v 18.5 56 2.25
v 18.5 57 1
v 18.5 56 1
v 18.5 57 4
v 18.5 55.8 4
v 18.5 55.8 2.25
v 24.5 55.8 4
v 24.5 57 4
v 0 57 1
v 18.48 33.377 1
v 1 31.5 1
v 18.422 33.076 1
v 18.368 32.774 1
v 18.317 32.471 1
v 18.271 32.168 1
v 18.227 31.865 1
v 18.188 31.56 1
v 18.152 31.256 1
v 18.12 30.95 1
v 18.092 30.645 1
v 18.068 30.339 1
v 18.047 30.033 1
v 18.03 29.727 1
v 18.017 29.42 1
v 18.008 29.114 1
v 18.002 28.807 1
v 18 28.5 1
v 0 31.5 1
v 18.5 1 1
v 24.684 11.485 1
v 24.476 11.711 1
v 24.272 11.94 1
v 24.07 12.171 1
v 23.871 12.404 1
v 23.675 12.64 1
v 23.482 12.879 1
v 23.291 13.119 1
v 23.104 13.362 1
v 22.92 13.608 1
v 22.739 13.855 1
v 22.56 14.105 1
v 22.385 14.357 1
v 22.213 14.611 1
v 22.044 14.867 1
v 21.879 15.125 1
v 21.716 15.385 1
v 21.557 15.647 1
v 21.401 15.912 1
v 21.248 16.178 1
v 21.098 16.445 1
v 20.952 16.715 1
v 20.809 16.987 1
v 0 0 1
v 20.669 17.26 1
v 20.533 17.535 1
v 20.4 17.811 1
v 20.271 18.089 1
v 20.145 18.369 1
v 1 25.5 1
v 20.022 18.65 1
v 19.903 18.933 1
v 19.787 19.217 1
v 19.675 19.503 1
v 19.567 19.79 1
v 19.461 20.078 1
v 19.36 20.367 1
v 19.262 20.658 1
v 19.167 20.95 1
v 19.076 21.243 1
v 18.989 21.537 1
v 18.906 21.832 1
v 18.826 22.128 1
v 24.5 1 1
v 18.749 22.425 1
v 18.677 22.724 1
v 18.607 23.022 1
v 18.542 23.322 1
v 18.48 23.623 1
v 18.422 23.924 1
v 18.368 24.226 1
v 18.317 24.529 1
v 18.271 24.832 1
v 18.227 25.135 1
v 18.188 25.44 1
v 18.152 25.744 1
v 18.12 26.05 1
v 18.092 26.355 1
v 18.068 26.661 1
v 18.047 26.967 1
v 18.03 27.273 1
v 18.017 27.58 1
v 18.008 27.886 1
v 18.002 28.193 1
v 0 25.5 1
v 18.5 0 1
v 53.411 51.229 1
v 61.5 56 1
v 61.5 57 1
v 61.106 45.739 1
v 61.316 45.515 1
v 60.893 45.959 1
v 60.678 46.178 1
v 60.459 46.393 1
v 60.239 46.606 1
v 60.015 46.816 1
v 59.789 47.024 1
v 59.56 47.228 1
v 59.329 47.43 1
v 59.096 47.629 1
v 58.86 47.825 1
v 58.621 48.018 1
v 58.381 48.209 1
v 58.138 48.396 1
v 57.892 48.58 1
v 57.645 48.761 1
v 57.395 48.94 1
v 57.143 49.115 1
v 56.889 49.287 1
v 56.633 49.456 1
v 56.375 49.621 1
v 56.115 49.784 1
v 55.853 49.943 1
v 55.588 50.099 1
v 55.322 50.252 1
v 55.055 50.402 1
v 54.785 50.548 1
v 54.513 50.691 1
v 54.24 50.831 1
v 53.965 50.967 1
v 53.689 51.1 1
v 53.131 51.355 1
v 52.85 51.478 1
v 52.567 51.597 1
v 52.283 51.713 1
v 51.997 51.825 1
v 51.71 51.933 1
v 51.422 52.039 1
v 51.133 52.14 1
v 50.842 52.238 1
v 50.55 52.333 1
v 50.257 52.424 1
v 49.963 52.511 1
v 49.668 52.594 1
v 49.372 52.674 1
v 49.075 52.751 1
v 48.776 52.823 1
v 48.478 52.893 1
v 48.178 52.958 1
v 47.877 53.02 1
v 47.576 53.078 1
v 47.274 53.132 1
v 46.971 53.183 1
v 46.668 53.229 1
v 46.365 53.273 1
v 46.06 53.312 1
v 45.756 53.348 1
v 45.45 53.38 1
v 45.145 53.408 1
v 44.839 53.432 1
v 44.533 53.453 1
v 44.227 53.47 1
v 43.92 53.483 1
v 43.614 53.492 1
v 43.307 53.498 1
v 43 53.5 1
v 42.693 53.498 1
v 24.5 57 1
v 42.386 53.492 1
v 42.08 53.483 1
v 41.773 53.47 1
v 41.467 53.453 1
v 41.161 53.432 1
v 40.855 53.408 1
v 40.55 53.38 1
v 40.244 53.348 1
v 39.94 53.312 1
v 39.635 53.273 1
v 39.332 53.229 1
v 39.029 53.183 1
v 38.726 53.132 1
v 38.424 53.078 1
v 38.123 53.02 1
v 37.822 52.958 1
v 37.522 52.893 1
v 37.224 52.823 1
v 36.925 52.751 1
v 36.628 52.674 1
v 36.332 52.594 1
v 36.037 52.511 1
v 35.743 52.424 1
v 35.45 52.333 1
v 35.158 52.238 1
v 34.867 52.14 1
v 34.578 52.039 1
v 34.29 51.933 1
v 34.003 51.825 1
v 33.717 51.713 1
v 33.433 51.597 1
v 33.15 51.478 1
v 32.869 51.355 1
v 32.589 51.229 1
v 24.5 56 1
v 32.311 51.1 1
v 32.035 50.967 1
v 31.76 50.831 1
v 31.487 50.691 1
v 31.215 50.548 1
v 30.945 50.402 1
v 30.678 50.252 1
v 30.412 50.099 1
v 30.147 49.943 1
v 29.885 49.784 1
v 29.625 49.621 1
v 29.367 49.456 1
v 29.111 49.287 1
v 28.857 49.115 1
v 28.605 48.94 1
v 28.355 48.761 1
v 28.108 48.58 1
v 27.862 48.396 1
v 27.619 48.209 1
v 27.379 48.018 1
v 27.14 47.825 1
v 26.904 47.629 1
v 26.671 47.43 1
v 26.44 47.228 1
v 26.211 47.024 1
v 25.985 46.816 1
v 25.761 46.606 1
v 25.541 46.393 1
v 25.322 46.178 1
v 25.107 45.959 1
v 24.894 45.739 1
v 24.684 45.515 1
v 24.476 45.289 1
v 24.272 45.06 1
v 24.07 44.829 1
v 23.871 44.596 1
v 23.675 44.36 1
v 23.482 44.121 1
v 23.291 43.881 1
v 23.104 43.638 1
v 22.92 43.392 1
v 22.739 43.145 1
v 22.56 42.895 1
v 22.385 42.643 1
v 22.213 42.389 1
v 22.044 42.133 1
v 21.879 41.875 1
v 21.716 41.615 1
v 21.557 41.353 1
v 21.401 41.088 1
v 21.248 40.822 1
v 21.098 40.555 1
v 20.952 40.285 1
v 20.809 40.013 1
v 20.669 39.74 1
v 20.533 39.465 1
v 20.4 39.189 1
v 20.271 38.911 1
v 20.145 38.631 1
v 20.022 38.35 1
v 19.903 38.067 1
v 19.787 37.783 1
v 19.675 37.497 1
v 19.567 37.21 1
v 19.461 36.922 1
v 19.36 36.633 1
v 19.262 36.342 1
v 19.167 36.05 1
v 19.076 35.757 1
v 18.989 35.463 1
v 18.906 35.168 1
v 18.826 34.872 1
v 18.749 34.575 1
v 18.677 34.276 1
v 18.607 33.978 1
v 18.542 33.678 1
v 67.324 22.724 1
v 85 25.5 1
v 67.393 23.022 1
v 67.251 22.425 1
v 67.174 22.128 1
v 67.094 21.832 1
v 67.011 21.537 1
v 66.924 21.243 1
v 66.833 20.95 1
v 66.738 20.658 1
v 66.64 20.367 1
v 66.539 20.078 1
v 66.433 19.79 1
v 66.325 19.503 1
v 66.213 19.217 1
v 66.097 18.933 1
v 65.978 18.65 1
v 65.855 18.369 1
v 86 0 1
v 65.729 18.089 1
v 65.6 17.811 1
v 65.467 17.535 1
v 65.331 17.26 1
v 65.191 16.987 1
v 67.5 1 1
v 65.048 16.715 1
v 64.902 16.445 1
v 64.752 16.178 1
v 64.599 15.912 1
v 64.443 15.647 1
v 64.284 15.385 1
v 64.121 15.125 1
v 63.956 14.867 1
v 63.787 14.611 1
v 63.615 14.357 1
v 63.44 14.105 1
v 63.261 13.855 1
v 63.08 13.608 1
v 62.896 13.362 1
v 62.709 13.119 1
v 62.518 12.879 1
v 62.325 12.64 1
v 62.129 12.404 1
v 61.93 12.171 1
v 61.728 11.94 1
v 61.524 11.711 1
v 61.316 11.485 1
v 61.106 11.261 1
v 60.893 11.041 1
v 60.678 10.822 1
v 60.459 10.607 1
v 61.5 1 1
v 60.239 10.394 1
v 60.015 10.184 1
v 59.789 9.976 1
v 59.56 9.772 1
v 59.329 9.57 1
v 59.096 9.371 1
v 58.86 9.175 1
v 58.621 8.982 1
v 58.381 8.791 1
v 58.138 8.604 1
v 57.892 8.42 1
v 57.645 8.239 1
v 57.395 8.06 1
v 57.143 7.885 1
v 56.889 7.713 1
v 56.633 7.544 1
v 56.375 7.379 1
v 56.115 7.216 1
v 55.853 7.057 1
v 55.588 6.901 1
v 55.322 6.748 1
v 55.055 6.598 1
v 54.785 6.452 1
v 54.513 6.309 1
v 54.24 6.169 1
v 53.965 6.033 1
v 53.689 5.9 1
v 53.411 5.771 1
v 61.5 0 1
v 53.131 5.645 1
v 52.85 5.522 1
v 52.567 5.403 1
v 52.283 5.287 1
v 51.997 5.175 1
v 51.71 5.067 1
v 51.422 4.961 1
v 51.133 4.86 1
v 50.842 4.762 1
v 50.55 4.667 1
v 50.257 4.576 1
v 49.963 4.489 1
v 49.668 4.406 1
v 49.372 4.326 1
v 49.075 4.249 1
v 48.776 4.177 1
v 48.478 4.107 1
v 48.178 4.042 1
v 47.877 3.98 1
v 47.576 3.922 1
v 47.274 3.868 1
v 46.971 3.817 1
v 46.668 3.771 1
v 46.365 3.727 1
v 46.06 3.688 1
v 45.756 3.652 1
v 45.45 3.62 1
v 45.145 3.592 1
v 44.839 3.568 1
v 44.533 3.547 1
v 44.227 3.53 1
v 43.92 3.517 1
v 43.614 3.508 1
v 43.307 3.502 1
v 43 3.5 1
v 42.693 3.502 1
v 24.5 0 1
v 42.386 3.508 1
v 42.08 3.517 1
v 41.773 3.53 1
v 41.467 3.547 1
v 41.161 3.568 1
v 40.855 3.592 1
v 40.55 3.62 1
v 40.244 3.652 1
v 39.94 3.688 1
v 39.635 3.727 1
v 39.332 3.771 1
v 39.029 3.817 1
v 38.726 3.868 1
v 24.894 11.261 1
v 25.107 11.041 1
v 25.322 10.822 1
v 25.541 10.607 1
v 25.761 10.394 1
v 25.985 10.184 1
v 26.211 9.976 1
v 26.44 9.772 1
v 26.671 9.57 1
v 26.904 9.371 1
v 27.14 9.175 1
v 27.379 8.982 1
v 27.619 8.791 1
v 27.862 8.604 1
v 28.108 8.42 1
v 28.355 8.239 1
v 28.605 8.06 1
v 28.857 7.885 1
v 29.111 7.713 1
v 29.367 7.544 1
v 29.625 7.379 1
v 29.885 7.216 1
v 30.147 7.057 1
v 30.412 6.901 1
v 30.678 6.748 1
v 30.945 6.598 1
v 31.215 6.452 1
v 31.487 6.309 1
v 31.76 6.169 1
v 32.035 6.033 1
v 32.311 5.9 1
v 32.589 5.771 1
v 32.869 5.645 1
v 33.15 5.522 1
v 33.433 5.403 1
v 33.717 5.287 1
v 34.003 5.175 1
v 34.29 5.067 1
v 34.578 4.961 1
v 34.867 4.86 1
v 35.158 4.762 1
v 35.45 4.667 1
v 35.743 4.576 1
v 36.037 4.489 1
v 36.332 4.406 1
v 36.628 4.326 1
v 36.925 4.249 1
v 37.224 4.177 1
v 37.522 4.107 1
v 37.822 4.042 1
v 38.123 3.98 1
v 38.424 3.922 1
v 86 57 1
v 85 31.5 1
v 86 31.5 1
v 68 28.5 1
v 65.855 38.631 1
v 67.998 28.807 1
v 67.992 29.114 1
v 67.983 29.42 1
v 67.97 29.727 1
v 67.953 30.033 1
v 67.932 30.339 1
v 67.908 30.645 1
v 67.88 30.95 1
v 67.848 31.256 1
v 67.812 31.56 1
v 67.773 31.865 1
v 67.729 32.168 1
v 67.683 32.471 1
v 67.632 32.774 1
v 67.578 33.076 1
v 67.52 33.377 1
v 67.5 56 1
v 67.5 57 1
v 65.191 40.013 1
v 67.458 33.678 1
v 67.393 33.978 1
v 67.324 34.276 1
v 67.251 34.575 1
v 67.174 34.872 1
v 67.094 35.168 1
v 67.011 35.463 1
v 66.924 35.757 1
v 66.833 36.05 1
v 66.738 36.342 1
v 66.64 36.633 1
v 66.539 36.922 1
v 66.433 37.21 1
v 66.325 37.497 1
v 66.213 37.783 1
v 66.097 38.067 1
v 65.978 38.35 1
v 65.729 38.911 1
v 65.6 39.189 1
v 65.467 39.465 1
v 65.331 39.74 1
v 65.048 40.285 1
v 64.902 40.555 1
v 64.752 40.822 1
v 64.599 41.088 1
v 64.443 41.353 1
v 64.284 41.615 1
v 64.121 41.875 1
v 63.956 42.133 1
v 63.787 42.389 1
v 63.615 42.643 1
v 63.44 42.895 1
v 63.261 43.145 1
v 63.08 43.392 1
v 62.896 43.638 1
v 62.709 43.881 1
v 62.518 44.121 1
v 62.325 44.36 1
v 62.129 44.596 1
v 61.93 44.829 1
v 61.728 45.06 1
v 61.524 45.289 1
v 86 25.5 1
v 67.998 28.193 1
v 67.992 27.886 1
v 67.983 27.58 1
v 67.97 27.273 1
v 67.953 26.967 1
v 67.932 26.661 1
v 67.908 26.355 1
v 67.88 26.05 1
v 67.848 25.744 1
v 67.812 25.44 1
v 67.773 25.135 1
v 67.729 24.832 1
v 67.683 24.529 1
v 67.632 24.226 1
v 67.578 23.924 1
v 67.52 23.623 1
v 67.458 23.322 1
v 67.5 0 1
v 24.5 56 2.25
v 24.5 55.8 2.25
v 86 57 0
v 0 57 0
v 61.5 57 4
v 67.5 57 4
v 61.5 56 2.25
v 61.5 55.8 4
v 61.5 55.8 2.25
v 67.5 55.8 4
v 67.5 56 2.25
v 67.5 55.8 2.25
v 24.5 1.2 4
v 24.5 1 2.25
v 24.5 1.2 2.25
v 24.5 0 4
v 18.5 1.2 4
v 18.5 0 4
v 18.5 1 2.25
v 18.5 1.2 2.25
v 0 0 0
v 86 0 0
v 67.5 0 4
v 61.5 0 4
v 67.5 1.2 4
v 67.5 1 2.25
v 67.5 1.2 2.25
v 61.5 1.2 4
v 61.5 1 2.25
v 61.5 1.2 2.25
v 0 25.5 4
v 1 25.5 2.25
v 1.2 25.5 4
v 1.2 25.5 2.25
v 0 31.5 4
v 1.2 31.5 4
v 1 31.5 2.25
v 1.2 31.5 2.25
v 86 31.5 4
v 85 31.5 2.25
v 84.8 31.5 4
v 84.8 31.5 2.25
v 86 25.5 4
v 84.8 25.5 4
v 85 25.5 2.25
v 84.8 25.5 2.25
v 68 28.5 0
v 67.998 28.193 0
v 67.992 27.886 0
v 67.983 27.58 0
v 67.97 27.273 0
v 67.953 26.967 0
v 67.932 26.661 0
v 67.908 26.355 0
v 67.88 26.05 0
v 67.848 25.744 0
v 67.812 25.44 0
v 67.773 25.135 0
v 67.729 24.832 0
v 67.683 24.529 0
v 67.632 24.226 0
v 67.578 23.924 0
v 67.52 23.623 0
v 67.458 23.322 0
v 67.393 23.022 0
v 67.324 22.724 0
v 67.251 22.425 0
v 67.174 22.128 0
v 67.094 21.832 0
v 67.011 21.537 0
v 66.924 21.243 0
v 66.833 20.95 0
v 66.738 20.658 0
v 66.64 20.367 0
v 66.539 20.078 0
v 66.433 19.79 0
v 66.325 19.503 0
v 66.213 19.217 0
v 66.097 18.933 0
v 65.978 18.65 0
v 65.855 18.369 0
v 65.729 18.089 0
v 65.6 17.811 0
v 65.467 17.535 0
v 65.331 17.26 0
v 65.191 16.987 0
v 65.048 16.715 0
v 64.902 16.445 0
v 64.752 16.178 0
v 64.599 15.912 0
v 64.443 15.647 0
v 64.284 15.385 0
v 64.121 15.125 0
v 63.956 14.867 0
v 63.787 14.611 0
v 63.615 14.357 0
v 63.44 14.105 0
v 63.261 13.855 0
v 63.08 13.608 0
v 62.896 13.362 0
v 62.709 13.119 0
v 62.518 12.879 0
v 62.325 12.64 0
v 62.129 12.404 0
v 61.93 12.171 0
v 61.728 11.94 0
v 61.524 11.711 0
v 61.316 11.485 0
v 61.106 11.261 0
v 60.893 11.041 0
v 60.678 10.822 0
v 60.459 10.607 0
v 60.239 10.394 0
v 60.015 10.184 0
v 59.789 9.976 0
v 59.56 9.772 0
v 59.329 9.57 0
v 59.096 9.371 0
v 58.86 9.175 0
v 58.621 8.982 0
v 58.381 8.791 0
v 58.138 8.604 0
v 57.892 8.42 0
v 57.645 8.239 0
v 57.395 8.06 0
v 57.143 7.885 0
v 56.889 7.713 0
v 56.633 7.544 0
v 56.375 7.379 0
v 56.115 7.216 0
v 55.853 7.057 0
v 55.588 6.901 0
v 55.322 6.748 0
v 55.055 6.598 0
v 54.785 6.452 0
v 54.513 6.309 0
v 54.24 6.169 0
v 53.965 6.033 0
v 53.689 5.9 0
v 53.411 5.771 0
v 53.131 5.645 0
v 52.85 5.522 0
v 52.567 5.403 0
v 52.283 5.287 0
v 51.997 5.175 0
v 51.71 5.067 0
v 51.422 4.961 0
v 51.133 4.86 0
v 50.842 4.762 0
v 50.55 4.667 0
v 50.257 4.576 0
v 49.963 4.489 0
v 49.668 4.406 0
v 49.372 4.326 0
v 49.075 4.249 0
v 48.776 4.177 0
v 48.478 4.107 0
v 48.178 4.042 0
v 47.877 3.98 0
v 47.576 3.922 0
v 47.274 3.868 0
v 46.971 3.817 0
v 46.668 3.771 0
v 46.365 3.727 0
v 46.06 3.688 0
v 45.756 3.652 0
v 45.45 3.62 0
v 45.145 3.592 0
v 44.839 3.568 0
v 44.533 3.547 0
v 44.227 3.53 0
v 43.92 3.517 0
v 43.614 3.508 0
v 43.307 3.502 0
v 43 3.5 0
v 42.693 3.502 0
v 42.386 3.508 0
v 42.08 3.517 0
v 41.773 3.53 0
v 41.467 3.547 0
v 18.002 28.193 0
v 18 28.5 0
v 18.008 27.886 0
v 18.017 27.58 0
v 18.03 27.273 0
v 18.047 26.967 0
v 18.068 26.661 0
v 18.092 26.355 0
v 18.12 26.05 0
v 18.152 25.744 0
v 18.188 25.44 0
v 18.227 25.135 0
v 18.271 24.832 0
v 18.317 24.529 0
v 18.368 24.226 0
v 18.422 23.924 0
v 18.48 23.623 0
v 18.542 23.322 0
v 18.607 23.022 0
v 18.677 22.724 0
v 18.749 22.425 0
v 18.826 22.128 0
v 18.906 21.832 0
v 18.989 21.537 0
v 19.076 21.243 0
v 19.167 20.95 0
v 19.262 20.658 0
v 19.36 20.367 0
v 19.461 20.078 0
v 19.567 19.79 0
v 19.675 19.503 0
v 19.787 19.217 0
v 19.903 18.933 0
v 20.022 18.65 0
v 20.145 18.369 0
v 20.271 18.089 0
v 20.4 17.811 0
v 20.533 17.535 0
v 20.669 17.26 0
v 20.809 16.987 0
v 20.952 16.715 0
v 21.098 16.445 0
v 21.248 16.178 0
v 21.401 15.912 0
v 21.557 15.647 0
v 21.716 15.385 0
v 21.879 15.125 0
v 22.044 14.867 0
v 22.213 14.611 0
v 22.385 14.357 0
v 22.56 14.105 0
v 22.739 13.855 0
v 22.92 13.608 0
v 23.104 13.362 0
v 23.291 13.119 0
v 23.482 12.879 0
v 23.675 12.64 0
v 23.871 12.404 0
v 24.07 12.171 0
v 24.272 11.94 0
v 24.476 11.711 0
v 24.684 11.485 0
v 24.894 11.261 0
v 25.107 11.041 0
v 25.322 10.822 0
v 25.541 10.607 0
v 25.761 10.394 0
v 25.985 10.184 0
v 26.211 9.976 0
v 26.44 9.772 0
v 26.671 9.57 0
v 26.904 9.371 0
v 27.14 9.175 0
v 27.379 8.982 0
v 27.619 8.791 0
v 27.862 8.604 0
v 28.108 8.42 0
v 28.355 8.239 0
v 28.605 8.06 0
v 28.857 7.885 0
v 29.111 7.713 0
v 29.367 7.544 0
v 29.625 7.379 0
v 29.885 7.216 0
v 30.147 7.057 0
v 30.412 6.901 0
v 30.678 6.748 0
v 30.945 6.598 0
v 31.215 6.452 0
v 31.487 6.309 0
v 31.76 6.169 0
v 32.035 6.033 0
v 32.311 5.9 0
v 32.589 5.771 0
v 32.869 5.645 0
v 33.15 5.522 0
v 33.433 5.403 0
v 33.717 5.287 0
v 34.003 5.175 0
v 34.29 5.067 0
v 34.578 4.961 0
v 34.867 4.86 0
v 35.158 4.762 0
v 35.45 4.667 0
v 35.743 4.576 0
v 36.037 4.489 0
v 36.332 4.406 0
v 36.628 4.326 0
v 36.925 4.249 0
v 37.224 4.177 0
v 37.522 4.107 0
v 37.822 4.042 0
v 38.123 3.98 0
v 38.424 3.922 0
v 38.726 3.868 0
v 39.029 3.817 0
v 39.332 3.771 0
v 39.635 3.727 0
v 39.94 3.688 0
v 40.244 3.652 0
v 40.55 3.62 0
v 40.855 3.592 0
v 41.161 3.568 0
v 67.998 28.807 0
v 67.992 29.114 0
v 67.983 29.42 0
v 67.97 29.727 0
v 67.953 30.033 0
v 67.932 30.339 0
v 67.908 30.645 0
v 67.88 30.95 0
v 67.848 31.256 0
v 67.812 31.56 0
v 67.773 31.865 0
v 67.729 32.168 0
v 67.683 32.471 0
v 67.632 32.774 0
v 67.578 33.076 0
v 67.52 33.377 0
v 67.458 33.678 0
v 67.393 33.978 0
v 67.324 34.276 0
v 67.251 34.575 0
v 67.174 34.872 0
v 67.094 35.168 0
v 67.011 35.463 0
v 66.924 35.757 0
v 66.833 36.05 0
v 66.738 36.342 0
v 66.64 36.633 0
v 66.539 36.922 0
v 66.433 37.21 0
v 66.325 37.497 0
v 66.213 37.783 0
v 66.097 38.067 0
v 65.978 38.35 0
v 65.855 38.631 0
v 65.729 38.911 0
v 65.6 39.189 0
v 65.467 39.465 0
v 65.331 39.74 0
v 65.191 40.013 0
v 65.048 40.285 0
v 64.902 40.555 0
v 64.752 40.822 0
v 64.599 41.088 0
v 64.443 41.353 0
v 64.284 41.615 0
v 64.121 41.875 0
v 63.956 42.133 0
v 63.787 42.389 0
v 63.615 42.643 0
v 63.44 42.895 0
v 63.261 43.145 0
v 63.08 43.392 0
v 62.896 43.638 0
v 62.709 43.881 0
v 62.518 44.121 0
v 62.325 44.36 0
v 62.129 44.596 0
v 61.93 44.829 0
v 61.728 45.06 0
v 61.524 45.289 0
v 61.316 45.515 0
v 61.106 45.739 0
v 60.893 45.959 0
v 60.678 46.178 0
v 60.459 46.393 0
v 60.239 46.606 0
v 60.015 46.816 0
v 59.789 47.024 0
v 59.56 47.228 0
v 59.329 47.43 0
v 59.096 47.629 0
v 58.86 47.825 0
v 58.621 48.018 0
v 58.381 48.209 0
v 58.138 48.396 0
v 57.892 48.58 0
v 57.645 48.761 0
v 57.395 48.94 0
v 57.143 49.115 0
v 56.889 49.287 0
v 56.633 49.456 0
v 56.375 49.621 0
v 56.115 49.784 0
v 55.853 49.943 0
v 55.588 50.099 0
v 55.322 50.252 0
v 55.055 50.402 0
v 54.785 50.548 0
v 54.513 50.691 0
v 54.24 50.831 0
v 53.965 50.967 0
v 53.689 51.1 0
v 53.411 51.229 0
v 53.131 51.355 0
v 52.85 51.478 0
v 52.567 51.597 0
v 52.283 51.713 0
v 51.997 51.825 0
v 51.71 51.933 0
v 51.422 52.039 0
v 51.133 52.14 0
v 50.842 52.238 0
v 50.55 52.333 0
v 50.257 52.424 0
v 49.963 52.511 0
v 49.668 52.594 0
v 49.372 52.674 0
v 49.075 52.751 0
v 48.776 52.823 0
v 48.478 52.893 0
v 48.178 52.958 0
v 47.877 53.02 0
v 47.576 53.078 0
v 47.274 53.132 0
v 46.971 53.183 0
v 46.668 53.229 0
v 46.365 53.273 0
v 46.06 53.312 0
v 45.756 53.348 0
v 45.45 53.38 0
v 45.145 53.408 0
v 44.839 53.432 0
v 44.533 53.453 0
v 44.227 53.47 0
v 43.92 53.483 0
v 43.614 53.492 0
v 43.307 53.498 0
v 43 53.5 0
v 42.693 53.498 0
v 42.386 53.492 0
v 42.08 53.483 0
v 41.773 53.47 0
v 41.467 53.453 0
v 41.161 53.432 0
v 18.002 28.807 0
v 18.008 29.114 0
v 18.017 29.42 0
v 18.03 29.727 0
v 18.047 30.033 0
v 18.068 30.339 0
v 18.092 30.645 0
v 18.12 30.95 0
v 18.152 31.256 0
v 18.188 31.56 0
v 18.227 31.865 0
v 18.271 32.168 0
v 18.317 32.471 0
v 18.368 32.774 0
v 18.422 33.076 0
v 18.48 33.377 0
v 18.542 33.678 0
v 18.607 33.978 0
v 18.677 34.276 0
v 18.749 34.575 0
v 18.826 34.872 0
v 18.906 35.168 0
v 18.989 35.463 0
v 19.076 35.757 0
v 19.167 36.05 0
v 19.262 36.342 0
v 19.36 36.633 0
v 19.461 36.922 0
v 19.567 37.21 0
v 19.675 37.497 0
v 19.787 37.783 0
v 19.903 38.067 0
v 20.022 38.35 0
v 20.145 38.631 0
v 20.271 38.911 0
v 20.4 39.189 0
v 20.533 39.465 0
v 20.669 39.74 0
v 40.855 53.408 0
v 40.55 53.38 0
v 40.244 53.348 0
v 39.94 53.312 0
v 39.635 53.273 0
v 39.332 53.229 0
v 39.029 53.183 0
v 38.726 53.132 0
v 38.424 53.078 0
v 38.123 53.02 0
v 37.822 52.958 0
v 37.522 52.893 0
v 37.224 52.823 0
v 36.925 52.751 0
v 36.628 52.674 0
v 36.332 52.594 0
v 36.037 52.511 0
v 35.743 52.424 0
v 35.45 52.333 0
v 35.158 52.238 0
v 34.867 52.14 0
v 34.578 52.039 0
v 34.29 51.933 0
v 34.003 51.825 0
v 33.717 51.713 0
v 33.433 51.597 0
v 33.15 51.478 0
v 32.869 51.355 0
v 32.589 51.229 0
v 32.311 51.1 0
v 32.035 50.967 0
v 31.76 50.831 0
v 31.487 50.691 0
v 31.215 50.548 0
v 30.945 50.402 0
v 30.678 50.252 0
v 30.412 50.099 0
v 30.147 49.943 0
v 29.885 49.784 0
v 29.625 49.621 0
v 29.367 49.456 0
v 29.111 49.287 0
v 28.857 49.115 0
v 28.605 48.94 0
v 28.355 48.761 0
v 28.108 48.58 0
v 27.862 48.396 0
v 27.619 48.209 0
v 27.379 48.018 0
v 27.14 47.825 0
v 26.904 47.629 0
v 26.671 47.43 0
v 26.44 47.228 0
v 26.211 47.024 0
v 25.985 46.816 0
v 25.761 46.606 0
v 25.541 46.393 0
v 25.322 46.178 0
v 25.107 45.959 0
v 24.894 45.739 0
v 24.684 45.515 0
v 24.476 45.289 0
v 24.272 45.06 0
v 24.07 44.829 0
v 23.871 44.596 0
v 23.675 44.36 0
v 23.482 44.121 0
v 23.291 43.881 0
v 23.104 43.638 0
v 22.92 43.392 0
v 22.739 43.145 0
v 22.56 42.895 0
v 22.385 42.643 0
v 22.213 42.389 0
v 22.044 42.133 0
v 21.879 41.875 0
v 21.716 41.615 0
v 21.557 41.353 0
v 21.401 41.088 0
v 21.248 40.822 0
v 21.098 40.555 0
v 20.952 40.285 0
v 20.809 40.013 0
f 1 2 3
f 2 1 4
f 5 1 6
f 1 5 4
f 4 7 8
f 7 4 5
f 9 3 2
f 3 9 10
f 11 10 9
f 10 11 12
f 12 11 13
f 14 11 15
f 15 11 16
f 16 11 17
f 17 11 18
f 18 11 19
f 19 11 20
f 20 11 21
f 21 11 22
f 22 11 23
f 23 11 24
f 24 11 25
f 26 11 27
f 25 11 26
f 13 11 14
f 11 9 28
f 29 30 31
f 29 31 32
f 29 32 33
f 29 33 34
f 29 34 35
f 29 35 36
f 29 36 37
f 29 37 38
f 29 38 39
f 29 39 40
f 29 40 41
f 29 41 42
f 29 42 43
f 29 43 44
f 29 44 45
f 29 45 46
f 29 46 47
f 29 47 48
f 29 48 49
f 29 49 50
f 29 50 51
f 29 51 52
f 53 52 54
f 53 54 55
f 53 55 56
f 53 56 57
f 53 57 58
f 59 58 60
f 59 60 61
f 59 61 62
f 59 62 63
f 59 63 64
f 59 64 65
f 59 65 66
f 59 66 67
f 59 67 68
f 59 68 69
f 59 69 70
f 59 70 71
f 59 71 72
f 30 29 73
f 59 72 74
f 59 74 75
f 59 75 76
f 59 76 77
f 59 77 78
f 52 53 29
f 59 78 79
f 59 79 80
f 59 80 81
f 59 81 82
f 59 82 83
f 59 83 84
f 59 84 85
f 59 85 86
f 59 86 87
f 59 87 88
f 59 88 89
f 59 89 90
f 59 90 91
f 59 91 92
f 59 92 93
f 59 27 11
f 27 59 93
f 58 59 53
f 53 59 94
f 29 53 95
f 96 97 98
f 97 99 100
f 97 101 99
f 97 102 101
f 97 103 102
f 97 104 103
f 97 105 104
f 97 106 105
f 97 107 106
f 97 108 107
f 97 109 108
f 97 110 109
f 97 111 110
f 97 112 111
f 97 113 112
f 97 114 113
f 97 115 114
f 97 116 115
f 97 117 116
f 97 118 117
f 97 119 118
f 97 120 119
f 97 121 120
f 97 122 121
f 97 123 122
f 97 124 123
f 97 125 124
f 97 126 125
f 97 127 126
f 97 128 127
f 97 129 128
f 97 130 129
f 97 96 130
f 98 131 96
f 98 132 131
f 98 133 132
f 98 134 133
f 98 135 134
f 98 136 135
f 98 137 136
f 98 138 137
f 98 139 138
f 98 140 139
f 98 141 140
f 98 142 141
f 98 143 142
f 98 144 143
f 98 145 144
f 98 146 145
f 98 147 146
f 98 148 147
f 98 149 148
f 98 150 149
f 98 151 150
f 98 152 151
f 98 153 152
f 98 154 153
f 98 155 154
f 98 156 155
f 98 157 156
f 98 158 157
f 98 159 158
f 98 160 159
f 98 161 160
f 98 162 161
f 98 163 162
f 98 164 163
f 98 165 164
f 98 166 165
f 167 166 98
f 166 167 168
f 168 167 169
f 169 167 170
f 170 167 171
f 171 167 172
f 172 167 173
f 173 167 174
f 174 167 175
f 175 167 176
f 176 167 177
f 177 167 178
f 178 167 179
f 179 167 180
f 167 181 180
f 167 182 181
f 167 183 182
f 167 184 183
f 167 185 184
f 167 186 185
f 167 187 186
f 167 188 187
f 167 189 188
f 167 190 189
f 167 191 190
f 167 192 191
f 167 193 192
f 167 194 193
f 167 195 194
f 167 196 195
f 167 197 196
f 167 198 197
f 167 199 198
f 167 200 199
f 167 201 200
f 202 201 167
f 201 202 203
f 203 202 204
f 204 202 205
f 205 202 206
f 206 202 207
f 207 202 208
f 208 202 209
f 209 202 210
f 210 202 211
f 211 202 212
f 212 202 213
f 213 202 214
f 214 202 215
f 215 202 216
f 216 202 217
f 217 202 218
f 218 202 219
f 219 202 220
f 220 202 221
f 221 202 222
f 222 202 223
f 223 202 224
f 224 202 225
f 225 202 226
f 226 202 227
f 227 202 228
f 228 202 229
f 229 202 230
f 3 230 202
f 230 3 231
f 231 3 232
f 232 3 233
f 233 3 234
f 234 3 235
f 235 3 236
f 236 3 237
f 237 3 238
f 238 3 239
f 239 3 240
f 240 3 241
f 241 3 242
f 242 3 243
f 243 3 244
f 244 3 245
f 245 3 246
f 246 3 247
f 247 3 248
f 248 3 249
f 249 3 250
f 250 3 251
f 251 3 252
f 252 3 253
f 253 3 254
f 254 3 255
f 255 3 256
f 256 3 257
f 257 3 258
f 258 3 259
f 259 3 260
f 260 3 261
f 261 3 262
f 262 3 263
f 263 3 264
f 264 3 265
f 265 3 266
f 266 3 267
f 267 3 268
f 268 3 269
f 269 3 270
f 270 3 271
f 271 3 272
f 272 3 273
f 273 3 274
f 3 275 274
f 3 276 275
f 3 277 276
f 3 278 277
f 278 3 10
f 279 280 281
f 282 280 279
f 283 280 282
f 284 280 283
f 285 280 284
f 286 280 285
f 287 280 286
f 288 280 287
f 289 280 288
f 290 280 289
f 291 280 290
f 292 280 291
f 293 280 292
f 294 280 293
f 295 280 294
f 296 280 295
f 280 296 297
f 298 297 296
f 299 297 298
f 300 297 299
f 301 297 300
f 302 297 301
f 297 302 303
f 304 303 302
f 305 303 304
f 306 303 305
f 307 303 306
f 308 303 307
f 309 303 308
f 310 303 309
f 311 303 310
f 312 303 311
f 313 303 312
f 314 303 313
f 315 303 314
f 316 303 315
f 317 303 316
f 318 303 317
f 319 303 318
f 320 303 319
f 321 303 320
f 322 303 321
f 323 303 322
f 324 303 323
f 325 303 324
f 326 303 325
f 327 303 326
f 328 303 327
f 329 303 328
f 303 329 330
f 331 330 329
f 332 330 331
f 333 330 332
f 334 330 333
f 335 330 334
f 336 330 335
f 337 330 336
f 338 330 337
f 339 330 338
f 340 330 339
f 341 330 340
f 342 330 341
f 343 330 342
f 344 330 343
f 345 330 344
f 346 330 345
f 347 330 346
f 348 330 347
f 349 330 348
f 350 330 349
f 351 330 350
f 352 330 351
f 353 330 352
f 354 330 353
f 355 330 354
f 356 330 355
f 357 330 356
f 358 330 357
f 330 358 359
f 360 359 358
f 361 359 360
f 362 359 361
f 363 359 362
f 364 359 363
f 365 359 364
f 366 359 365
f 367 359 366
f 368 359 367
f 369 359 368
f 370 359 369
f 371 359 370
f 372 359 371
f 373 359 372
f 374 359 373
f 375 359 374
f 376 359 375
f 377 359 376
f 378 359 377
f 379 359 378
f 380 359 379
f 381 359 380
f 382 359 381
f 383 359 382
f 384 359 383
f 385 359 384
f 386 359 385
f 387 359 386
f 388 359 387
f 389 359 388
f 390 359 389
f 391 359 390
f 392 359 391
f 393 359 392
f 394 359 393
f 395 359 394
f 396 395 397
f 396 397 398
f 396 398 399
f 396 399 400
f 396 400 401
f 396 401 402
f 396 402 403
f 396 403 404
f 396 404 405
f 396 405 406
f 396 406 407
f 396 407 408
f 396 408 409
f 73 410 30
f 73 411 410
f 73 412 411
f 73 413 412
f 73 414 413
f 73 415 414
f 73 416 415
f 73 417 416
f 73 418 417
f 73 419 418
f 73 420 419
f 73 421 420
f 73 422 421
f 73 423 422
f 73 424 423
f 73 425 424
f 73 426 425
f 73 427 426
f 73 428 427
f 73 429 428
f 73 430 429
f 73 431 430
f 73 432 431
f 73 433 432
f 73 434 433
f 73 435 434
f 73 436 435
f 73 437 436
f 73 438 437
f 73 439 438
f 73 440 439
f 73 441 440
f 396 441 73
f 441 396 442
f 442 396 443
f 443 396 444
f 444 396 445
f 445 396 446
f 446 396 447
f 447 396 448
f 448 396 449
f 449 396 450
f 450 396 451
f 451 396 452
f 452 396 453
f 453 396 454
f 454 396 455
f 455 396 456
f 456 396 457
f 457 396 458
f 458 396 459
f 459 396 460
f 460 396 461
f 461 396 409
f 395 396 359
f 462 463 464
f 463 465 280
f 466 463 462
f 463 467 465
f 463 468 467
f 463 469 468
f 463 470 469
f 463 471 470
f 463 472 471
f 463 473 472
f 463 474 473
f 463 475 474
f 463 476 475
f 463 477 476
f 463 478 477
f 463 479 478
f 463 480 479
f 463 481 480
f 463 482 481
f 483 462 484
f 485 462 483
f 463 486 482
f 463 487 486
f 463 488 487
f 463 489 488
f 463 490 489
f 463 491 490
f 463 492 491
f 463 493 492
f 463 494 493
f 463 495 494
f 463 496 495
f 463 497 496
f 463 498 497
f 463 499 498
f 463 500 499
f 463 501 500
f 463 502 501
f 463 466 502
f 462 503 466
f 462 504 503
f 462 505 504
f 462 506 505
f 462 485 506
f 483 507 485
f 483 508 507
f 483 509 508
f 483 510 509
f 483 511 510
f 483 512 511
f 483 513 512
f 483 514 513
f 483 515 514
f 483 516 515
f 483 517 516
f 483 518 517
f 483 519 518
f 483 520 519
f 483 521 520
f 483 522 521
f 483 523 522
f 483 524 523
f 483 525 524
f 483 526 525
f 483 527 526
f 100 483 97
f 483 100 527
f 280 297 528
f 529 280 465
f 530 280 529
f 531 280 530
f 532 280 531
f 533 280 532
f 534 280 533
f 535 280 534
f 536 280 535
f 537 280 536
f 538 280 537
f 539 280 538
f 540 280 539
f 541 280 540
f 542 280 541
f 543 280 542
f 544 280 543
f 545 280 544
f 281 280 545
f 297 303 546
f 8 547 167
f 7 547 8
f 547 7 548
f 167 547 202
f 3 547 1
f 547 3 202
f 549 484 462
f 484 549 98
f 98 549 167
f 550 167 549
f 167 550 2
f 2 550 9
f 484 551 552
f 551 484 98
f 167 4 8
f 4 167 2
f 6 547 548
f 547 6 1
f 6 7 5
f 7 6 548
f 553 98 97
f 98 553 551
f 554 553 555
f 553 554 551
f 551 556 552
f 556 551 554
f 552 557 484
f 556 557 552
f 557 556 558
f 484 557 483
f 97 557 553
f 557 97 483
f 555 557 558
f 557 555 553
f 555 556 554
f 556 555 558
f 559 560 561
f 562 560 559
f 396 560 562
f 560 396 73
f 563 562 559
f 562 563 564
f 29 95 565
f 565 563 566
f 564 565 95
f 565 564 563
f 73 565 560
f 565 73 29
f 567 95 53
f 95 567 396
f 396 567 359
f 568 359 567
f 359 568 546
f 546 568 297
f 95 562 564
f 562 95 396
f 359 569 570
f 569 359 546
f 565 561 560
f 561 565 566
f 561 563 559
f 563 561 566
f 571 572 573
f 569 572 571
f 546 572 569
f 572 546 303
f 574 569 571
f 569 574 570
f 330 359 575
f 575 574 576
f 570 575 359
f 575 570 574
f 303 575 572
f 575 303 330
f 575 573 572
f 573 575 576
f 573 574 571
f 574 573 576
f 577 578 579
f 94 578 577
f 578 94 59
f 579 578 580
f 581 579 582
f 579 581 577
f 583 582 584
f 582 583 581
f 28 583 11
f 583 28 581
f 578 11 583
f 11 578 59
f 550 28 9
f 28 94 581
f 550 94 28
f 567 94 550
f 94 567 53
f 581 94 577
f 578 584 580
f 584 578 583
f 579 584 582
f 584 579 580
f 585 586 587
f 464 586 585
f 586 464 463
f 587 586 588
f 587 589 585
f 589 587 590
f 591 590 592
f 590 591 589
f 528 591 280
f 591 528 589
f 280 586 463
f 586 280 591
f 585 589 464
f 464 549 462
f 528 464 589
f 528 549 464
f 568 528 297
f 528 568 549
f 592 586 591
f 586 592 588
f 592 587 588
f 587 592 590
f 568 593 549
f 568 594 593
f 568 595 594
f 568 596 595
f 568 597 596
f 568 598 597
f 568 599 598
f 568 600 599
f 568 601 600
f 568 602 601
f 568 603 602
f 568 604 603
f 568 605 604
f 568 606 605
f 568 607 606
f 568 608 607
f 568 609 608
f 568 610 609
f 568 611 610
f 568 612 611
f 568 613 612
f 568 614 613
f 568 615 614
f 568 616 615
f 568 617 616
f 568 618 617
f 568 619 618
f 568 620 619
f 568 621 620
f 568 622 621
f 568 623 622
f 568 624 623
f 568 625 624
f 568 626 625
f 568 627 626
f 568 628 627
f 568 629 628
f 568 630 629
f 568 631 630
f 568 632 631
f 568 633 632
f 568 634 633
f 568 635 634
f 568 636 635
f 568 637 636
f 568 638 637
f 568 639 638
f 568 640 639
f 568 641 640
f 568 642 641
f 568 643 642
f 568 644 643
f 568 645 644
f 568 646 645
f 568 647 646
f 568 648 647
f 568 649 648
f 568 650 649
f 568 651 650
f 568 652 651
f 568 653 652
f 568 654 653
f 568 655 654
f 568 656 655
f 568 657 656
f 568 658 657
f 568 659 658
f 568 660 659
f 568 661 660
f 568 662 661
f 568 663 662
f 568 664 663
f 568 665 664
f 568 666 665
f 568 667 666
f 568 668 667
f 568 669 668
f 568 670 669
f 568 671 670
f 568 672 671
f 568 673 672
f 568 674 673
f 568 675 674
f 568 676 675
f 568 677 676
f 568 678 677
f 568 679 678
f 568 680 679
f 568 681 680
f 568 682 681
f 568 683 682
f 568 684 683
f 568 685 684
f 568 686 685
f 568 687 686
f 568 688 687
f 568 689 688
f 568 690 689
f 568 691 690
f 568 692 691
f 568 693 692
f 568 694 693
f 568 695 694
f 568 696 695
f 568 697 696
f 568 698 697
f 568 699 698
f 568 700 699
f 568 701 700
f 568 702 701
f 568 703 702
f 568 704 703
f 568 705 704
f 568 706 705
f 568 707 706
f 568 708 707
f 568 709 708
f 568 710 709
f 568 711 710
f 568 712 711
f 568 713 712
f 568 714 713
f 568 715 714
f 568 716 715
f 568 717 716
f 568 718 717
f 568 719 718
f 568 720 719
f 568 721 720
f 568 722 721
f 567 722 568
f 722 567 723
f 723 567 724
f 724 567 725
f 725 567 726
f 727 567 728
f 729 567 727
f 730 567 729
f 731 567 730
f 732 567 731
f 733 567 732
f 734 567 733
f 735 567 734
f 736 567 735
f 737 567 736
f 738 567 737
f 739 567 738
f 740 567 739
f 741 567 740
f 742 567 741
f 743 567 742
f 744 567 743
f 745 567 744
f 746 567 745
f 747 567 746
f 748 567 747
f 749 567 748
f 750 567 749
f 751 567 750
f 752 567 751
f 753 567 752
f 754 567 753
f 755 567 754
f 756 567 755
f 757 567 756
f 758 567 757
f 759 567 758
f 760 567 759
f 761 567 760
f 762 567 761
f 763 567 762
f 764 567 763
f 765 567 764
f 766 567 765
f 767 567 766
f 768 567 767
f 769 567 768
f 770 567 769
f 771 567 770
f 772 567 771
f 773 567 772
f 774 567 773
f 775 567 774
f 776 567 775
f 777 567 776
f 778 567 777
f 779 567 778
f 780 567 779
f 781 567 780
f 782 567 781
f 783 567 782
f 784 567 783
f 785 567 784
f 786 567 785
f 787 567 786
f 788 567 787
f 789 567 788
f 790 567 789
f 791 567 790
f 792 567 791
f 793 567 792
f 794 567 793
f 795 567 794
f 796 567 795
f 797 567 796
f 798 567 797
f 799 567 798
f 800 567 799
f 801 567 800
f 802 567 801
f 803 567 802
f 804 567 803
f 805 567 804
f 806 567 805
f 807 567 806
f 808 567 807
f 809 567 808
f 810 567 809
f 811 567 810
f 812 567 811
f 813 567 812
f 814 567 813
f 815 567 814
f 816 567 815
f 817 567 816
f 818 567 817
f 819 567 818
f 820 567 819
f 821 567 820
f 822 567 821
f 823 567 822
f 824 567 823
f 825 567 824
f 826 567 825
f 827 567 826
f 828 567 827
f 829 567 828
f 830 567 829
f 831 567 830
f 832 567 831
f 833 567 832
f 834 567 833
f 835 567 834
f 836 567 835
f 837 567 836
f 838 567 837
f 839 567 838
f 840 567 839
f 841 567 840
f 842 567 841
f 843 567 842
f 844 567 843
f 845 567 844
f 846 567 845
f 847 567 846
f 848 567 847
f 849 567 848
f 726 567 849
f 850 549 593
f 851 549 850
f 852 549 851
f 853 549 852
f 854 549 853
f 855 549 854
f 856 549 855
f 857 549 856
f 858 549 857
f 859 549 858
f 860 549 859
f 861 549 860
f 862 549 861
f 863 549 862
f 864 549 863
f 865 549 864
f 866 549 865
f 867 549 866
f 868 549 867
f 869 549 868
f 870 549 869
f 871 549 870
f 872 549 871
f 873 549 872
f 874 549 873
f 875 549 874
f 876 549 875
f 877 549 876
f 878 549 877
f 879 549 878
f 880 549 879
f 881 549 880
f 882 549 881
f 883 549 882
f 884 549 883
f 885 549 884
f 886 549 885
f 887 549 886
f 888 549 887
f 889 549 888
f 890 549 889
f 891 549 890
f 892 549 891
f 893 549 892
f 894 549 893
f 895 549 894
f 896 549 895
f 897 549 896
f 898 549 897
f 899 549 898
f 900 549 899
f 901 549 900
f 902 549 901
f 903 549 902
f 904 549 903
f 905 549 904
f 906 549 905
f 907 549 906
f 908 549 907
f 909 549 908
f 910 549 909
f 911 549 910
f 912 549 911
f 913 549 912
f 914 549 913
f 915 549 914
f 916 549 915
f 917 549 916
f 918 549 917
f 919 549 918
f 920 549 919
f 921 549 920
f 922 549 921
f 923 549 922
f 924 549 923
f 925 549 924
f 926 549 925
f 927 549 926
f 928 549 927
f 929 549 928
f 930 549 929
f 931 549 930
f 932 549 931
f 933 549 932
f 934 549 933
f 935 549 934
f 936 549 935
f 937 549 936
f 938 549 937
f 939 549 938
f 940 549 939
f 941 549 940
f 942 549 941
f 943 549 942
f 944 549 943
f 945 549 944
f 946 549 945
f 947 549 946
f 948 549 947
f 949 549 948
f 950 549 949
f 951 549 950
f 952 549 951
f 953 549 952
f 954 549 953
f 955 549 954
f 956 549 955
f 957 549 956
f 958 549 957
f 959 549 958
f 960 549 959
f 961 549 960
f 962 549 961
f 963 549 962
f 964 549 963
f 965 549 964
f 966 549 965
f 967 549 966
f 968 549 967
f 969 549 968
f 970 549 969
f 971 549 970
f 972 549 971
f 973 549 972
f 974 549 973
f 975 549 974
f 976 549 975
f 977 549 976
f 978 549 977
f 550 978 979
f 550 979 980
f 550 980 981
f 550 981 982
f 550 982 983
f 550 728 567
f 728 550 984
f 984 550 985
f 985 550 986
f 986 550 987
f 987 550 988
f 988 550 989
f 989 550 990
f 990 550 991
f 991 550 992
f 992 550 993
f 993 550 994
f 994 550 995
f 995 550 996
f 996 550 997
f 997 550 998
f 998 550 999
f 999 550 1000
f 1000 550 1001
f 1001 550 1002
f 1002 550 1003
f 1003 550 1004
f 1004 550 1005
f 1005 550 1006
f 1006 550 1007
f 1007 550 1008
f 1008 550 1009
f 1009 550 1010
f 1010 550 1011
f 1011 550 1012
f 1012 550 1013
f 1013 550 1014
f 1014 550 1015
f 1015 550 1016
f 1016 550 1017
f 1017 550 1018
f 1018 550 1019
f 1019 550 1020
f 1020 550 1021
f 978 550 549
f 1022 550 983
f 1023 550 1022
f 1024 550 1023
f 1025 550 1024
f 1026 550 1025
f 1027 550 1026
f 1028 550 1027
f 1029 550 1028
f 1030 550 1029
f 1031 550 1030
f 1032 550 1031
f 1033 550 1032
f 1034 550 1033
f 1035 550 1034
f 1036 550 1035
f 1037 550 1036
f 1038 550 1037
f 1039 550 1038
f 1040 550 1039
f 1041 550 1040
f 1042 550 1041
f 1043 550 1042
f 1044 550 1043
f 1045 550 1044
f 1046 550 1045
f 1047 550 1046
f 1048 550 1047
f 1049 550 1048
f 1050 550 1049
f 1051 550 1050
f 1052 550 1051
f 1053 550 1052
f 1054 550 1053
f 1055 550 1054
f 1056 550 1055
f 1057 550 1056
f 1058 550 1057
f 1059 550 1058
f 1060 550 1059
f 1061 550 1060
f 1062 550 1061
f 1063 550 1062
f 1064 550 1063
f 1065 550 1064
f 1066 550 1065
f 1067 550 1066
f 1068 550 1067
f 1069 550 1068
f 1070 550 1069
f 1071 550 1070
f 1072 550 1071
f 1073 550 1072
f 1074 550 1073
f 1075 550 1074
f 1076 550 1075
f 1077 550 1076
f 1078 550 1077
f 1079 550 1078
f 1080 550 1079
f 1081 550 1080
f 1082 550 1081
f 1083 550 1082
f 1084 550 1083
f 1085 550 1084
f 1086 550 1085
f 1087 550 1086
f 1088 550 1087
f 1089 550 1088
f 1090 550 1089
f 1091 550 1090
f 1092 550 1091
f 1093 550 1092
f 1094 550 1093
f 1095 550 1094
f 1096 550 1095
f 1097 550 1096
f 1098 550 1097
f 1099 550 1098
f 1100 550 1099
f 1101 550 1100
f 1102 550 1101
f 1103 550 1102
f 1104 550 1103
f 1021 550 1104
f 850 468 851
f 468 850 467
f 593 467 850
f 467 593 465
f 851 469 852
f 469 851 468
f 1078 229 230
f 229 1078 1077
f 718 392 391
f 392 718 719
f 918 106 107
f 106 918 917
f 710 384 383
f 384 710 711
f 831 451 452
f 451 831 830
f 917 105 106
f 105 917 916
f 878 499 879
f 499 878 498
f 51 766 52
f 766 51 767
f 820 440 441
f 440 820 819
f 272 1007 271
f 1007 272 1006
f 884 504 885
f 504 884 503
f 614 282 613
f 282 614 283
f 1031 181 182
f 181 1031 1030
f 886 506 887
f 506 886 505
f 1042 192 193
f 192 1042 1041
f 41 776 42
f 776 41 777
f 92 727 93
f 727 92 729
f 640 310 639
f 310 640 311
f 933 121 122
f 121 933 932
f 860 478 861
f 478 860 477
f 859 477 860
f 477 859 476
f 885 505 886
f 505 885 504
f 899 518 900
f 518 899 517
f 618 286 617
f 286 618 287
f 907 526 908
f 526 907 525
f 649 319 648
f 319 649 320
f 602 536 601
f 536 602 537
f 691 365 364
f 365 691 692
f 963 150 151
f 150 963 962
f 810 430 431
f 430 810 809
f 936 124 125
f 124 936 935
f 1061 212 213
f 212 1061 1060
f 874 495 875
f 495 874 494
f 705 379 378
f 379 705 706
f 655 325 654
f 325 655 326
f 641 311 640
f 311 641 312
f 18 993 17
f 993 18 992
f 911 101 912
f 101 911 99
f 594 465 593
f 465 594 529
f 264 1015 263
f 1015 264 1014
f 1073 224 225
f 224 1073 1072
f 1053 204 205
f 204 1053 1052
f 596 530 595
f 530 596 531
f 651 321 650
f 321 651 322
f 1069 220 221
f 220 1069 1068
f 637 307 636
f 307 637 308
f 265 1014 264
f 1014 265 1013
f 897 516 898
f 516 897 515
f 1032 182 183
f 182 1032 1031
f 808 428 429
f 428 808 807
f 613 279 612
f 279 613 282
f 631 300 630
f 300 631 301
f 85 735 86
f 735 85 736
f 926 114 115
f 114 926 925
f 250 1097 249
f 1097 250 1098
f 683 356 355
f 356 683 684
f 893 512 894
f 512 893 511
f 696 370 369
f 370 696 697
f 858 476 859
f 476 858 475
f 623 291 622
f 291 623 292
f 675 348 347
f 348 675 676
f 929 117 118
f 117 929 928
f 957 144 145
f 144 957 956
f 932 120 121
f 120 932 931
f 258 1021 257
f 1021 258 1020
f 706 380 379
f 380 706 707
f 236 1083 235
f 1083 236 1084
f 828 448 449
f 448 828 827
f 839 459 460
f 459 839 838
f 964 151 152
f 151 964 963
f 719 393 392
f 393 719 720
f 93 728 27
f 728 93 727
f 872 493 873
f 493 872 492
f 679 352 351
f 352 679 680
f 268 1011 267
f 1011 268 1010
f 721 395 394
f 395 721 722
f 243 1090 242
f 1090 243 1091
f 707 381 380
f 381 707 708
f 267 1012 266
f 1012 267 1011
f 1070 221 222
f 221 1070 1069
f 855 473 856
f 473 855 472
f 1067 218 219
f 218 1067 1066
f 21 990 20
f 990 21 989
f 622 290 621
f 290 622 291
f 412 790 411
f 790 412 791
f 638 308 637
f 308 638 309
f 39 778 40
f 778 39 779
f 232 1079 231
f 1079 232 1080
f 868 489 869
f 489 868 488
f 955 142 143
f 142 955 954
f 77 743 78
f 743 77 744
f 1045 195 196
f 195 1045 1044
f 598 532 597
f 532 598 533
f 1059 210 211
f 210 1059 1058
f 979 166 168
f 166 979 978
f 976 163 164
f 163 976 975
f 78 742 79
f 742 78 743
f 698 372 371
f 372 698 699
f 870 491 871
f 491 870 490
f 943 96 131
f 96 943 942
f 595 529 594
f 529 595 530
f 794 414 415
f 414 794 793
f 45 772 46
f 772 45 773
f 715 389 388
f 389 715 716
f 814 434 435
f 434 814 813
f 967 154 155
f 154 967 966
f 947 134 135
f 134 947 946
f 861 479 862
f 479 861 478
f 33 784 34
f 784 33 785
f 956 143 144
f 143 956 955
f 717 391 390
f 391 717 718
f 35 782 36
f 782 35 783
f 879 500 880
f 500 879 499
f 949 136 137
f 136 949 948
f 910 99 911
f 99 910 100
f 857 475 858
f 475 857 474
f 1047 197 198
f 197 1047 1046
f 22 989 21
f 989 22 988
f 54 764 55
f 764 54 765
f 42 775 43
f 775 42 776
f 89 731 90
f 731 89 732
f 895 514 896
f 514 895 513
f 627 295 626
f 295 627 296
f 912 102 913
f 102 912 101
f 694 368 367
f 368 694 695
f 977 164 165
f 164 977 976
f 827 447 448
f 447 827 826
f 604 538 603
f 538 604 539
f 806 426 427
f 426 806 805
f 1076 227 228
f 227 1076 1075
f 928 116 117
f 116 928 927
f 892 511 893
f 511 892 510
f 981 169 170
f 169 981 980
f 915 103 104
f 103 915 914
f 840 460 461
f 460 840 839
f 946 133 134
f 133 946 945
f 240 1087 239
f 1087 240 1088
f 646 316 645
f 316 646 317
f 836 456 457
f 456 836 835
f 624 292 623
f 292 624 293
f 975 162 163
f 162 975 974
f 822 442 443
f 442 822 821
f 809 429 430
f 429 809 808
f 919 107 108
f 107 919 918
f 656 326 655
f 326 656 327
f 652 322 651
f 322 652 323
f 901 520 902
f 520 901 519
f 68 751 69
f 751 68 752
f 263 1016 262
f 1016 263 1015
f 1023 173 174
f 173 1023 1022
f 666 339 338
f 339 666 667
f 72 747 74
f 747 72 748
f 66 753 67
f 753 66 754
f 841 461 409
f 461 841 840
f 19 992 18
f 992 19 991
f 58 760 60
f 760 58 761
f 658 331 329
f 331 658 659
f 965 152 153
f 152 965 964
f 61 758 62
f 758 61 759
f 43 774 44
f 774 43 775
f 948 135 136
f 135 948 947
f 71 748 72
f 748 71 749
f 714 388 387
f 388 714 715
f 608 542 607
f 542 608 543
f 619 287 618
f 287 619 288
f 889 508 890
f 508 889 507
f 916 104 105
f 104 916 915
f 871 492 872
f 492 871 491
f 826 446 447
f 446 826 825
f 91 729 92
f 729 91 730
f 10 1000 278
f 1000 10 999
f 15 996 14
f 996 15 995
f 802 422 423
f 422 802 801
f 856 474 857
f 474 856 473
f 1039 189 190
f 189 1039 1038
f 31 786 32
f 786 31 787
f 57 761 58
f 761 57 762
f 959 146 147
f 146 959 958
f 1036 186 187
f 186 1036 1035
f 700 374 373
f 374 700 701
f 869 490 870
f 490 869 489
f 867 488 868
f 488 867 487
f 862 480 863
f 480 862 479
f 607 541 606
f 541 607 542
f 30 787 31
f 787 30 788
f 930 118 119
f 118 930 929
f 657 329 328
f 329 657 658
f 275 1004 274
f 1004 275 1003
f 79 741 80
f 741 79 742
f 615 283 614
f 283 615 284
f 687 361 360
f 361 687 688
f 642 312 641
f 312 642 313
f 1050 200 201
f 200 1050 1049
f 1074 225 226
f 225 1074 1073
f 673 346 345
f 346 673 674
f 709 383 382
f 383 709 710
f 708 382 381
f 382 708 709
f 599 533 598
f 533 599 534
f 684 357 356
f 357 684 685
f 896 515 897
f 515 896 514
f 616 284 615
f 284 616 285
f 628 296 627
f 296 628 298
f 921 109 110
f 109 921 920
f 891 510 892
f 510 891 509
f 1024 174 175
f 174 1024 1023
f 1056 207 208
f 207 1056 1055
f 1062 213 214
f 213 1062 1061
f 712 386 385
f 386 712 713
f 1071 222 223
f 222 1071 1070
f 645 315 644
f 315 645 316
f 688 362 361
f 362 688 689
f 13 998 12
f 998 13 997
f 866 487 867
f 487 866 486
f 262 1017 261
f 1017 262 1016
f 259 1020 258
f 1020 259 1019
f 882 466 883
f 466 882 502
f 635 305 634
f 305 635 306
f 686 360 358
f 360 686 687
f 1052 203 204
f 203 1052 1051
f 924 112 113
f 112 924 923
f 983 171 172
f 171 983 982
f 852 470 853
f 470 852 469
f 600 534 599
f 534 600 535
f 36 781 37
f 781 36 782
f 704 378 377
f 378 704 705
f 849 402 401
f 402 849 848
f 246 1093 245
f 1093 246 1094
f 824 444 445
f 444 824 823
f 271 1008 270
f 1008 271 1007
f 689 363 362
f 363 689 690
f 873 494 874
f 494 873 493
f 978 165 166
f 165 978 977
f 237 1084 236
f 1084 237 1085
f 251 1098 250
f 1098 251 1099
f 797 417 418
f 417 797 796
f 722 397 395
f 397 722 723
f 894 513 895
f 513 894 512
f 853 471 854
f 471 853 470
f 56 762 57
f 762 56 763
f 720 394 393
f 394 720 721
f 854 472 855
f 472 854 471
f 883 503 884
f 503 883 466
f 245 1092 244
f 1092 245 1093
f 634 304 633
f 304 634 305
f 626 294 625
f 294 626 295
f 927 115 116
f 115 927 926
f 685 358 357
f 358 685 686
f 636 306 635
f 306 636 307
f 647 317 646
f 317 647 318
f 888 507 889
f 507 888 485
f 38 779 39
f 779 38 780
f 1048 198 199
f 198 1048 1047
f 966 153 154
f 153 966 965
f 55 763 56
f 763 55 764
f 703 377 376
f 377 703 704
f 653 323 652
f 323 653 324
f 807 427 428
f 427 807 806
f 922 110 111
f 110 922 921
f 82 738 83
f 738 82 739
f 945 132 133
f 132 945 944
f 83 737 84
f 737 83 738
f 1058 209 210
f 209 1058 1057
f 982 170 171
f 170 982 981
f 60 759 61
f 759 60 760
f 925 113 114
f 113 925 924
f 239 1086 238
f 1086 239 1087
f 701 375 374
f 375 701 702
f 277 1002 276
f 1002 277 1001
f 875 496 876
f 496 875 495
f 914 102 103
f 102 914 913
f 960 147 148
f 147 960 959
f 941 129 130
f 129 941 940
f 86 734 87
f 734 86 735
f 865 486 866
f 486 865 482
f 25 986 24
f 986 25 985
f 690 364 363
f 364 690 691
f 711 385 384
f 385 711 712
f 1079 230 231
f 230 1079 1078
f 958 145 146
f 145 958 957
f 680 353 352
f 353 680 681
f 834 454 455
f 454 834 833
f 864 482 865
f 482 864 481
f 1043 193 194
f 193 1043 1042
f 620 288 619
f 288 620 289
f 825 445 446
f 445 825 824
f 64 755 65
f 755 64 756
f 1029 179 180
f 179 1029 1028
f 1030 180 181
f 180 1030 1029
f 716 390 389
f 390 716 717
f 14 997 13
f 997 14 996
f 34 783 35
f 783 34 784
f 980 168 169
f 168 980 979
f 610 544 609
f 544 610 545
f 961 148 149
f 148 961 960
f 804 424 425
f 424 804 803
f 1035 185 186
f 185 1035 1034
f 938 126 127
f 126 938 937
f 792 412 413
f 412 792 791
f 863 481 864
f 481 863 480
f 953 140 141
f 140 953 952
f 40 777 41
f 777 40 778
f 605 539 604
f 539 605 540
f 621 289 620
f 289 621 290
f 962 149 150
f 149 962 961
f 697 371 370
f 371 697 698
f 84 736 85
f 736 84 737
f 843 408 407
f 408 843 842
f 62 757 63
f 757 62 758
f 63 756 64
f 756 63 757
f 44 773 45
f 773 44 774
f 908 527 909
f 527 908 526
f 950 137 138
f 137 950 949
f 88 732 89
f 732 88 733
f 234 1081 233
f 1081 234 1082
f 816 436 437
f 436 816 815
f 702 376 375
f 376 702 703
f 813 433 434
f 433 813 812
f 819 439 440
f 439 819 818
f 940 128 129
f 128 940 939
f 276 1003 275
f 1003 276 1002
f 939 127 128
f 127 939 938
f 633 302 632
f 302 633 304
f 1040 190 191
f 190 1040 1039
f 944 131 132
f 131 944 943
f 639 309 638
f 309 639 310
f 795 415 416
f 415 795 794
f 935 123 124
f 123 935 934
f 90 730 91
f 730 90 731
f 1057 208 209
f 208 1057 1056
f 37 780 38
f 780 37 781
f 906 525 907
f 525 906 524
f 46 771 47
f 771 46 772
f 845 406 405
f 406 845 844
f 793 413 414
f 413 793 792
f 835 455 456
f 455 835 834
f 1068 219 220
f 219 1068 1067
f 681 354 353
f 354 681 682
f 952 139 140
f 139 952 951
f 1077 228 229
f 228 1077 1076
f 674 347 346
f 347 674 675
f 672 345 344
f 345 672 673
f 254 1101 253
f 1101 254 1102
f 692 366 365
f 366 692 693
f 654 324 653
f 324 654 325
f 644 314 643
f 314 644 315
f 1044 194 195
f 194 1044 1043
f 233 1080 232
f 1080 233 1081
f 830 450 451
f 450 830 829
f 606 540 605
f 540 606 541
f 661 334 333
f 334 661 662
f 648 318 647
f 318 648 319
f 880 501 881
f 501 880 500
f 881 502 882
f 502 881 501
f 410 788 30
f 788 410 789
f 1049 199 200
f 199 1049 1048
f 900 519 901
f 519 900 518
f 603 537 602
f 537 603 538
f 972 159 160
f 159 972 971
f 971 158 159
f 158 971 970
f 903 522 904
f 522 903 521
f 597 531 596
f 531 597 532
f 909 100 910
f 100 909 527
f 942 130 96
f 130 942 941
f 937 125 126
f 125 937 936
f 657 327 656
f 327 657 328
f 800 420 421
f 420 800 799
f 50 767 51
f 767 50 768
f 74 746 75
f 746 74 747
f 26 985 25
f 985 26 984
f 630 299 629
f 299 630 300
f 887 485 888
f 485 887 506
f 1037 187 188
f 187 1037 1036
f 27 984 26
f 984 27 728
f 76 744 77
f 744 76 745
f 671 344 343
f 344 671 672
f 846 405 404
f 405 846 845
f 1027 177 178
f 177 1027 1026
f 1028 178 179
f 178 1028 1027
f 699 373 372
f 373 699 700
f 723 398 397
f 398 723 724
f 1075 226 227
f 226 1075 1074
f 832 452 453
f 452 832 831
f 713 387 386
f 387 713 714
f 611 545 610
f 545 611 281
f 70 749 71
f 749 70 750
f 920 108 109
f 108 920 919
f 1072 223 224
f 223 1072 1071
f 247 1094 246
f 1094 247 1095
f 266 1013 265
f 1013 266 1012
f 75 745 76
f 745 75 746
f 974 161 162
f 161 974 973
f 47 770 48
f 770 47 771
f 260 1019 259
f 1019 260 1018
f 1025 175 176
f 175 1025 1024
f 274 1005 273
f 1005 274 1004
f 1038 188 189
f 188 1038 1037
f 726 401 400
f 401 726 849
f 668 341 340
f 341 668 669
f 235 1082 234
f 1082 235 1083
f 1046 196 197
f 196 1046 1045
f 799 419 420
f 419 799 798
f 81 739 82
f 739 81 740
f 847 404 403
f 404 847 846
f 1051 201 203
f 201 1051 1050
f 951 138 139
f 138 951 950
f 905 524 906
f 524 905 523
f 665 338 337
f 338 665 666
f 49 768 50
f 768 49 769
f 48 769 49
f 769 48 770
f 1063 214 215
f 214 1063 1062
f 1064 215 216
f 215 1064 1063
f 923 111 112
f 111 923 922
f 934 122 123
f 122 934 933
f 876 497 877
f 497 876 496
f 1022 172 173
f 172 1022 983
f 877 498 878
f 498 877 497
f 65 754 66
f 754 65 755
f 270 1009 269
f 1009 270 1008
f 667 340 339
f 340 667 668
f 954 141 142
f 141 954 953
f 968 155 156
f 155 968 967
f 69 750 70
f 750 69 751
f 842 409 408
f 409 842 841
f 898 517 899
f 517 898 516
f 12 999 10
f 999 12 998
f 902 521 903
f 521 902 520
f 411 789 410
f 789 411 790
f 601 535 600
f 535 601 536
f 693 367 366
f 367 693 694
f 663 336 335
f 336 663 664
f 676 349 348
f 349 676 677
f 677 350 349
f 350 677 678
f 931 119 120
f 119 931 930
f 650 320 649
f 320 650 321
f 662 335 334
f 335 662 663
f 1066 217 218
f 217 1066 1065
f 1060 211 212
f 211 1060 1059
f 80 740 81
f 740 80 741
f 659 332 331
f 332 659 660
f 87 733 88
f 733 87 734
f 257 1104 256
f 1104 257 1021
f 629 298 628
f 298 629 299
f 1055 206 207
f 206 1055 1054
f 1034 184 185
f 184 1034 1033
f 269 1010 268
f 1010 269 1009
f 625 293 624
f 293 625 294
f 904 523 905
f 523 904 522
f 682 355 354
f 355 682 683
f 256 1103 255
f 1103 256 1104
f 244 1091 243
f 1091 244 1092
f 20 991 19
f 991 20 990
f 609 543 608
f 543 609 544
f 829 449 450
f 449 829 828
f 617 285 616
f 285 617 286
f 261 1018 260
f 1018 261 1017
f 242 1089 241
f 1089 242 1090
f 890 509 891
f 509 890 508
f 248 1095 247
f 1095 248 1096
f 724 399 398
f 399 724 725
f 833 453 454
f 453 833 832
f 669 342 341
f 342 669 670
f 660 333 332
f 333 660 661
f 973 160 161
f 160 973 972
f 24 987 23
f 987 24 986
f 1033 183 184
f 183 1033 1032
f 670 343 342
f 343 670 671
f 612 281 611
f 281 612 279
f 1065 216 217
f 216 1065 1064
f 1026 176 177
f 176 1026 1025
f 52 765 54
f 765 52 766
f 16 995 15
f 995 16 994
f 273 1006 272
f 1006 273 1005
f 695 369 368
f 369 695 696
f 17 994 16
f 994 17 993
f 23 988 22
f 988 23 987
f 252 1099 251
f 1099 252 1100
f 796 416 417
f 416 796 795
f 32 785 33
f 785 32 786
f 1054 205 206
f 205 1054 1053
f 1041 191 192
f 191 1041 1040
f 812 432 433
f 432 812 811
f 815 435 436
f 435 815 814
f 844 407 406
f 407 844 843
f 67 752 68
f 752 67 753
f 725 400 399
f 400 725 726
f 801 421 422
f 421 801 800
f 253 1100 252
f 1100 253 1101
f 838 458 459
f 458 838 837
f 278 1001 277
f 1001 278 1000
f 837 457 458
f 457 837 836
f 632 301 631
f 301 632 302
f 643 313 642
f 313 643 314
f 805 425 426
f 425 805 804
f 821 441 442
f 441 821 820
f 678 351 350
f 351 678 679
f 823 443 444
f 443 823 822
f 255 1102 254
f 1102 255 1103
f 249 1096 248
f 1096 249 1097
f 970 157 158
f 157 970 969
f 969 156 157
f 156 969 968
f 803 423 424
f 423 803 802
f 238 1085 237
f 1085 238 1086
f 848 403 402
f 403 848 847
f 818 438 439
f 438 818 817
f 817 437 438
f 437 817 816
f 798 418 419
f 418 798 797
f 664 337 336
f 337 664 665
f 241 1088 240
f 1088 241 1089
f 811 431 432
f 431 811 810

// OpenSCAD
fit_gap=0.0;

base_screen_width=84.0;
base_screen_depth=55.0;
base_screen_height=6.0;
base_screen_glass_height=1.25;

mask_thickness=1.0;
tabs_thickness=1.0;
tabs_width=6.0;
tabs_height=3.0;
tabs_buldge_thickness=0.2;

screen_width=base_screen_width + 2*tabs_thickness + fit_gap;
screen_depth=base_screen_depth + 2*tabs_thickness + fit_gap;
screen_height=6.0;

hole_diameter=50.0;

difference() {
    union() {
        // Base screen.
        cube([screen_width, screen_depth, mask_thickness]);
        
        // Tabs.
        translate([0, 0, mask_thickness])
        union() {
            translate([screen_width*0.25, screen_depth, 0]) rotate([0,0, 180])
                screen_tab();
            translate([screen_width*0.75, screen_depth, 0]) rotate([0,0, 180])
                screen_tab();
            
            translate([screen_width*0.25, 0, 0])
                screen_tab();
            translate([screen_width*0.75, 0, 0])
                screen_tab();
            
            translate([0, screen_depth/2, 0]) rotate([0,0,-90])
                screen_tab();
            translate([screen_width, screen_depth/2, 0]) rotate([0,0,90])
                screen_tab();
        }
    }
    
    // Remove circle.
    translate([screen_width/2, screen_depth/2, 0])
        cylinder(h=screen_height, d=hole_diameter, $fn=512);
//    cube([screen_width, screen_depth, mask_thickness]);
    
}

module screen_tab() {
    translate([-tabs_width/2, 0, 0])
        union() {
            cube([tabs_width, tabs_thickness, tabs_height]);
            translate([0, 0, base_screen_glass_height])
            cube([tabs_width, tabs_thickness+tabs_buldge_thickness, tabs_height-base_screen_glass_height]);
        }
}
